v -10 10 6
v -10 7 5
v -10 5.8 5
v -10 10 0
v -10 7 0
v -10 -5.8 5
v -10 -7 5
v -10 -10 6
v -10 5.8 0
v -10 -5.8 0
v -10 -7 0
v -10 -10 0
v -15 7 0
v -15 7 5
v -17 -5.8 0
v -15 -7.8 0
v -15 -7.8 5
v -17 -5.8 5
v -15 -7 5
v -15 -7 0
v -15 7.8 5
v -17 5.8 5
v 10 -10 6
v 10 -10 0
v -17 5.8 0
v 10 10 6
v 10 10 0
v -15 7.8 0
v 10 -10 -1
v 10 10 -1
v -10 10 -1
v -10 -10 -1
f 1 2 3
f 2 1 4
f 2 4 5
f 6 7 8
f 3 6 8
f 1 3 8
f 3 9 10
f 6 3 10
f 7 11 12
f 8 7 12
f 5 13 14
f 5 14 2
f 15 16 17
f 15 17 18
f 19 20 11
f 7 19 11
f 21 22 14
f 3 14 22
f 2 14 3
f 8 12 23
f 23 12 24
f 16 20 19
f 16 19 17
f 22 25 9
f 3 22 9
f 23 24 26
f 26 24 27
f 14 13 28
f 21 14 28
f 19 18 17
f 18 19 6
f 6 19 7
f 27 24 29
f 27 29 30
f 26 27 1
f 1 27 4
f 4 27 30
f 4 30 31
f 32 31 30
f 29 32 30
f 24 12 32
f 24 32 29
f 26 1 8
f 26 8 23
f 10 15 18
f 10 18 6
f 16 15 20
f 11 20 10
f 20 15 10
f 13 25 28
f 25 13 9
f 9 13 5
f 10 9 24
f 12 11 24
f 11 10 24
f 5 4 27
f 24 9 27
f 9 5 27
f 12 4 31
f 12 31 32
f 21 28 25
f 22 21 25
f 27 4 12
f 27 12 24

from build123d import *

# Parameters (mm, degrees)
F0_W     = 5
F0_H     = 1.2
F1_DEPTH = 5
F2_DEPTH = 1
F3_DEPTH = 6


with BuildPart() as f1:
    # F0 (on Top) → F1 (new body)
    with BuildSketch(Plane.XY):
        Polygon((-15, 5.8), (-15, 7), (-15, 7.8), (-17, 5.8), align=None)
        with Locations((-12.5, 6.4)):
            Rectangle(F0_W, F0_H)
    extrude(amount=F1_DEPTH)



with BuildPart() as f2:
    # F0 (on Top) → F2 (new body)
    with BuildSketch(Plane.XY):
        Polygon((10, -10), (10, 10), (-10, 10), (-10, 7), (-10, 5.8), (-10, -10), align=None)
    extrude(amount=-F2_DEPTH)


with BuildPart() as f1_1:
    add(f1.part)
    # F3 (add): a face of the model
    f3_faces = [f2.part.faces().sort_by_distance(p)[0] for p in [
        (0, 0, 0),
    ]]
    extrude(f3_faces, amount=F3_DEPTH)

    # F4: F1 across plane


with BuildPart() as f1_2:
    add(f1_1.part)
    add(f1_1.part.mirror(Plane.XZ))


solid = Compound([f2.part, f1_2.part])
